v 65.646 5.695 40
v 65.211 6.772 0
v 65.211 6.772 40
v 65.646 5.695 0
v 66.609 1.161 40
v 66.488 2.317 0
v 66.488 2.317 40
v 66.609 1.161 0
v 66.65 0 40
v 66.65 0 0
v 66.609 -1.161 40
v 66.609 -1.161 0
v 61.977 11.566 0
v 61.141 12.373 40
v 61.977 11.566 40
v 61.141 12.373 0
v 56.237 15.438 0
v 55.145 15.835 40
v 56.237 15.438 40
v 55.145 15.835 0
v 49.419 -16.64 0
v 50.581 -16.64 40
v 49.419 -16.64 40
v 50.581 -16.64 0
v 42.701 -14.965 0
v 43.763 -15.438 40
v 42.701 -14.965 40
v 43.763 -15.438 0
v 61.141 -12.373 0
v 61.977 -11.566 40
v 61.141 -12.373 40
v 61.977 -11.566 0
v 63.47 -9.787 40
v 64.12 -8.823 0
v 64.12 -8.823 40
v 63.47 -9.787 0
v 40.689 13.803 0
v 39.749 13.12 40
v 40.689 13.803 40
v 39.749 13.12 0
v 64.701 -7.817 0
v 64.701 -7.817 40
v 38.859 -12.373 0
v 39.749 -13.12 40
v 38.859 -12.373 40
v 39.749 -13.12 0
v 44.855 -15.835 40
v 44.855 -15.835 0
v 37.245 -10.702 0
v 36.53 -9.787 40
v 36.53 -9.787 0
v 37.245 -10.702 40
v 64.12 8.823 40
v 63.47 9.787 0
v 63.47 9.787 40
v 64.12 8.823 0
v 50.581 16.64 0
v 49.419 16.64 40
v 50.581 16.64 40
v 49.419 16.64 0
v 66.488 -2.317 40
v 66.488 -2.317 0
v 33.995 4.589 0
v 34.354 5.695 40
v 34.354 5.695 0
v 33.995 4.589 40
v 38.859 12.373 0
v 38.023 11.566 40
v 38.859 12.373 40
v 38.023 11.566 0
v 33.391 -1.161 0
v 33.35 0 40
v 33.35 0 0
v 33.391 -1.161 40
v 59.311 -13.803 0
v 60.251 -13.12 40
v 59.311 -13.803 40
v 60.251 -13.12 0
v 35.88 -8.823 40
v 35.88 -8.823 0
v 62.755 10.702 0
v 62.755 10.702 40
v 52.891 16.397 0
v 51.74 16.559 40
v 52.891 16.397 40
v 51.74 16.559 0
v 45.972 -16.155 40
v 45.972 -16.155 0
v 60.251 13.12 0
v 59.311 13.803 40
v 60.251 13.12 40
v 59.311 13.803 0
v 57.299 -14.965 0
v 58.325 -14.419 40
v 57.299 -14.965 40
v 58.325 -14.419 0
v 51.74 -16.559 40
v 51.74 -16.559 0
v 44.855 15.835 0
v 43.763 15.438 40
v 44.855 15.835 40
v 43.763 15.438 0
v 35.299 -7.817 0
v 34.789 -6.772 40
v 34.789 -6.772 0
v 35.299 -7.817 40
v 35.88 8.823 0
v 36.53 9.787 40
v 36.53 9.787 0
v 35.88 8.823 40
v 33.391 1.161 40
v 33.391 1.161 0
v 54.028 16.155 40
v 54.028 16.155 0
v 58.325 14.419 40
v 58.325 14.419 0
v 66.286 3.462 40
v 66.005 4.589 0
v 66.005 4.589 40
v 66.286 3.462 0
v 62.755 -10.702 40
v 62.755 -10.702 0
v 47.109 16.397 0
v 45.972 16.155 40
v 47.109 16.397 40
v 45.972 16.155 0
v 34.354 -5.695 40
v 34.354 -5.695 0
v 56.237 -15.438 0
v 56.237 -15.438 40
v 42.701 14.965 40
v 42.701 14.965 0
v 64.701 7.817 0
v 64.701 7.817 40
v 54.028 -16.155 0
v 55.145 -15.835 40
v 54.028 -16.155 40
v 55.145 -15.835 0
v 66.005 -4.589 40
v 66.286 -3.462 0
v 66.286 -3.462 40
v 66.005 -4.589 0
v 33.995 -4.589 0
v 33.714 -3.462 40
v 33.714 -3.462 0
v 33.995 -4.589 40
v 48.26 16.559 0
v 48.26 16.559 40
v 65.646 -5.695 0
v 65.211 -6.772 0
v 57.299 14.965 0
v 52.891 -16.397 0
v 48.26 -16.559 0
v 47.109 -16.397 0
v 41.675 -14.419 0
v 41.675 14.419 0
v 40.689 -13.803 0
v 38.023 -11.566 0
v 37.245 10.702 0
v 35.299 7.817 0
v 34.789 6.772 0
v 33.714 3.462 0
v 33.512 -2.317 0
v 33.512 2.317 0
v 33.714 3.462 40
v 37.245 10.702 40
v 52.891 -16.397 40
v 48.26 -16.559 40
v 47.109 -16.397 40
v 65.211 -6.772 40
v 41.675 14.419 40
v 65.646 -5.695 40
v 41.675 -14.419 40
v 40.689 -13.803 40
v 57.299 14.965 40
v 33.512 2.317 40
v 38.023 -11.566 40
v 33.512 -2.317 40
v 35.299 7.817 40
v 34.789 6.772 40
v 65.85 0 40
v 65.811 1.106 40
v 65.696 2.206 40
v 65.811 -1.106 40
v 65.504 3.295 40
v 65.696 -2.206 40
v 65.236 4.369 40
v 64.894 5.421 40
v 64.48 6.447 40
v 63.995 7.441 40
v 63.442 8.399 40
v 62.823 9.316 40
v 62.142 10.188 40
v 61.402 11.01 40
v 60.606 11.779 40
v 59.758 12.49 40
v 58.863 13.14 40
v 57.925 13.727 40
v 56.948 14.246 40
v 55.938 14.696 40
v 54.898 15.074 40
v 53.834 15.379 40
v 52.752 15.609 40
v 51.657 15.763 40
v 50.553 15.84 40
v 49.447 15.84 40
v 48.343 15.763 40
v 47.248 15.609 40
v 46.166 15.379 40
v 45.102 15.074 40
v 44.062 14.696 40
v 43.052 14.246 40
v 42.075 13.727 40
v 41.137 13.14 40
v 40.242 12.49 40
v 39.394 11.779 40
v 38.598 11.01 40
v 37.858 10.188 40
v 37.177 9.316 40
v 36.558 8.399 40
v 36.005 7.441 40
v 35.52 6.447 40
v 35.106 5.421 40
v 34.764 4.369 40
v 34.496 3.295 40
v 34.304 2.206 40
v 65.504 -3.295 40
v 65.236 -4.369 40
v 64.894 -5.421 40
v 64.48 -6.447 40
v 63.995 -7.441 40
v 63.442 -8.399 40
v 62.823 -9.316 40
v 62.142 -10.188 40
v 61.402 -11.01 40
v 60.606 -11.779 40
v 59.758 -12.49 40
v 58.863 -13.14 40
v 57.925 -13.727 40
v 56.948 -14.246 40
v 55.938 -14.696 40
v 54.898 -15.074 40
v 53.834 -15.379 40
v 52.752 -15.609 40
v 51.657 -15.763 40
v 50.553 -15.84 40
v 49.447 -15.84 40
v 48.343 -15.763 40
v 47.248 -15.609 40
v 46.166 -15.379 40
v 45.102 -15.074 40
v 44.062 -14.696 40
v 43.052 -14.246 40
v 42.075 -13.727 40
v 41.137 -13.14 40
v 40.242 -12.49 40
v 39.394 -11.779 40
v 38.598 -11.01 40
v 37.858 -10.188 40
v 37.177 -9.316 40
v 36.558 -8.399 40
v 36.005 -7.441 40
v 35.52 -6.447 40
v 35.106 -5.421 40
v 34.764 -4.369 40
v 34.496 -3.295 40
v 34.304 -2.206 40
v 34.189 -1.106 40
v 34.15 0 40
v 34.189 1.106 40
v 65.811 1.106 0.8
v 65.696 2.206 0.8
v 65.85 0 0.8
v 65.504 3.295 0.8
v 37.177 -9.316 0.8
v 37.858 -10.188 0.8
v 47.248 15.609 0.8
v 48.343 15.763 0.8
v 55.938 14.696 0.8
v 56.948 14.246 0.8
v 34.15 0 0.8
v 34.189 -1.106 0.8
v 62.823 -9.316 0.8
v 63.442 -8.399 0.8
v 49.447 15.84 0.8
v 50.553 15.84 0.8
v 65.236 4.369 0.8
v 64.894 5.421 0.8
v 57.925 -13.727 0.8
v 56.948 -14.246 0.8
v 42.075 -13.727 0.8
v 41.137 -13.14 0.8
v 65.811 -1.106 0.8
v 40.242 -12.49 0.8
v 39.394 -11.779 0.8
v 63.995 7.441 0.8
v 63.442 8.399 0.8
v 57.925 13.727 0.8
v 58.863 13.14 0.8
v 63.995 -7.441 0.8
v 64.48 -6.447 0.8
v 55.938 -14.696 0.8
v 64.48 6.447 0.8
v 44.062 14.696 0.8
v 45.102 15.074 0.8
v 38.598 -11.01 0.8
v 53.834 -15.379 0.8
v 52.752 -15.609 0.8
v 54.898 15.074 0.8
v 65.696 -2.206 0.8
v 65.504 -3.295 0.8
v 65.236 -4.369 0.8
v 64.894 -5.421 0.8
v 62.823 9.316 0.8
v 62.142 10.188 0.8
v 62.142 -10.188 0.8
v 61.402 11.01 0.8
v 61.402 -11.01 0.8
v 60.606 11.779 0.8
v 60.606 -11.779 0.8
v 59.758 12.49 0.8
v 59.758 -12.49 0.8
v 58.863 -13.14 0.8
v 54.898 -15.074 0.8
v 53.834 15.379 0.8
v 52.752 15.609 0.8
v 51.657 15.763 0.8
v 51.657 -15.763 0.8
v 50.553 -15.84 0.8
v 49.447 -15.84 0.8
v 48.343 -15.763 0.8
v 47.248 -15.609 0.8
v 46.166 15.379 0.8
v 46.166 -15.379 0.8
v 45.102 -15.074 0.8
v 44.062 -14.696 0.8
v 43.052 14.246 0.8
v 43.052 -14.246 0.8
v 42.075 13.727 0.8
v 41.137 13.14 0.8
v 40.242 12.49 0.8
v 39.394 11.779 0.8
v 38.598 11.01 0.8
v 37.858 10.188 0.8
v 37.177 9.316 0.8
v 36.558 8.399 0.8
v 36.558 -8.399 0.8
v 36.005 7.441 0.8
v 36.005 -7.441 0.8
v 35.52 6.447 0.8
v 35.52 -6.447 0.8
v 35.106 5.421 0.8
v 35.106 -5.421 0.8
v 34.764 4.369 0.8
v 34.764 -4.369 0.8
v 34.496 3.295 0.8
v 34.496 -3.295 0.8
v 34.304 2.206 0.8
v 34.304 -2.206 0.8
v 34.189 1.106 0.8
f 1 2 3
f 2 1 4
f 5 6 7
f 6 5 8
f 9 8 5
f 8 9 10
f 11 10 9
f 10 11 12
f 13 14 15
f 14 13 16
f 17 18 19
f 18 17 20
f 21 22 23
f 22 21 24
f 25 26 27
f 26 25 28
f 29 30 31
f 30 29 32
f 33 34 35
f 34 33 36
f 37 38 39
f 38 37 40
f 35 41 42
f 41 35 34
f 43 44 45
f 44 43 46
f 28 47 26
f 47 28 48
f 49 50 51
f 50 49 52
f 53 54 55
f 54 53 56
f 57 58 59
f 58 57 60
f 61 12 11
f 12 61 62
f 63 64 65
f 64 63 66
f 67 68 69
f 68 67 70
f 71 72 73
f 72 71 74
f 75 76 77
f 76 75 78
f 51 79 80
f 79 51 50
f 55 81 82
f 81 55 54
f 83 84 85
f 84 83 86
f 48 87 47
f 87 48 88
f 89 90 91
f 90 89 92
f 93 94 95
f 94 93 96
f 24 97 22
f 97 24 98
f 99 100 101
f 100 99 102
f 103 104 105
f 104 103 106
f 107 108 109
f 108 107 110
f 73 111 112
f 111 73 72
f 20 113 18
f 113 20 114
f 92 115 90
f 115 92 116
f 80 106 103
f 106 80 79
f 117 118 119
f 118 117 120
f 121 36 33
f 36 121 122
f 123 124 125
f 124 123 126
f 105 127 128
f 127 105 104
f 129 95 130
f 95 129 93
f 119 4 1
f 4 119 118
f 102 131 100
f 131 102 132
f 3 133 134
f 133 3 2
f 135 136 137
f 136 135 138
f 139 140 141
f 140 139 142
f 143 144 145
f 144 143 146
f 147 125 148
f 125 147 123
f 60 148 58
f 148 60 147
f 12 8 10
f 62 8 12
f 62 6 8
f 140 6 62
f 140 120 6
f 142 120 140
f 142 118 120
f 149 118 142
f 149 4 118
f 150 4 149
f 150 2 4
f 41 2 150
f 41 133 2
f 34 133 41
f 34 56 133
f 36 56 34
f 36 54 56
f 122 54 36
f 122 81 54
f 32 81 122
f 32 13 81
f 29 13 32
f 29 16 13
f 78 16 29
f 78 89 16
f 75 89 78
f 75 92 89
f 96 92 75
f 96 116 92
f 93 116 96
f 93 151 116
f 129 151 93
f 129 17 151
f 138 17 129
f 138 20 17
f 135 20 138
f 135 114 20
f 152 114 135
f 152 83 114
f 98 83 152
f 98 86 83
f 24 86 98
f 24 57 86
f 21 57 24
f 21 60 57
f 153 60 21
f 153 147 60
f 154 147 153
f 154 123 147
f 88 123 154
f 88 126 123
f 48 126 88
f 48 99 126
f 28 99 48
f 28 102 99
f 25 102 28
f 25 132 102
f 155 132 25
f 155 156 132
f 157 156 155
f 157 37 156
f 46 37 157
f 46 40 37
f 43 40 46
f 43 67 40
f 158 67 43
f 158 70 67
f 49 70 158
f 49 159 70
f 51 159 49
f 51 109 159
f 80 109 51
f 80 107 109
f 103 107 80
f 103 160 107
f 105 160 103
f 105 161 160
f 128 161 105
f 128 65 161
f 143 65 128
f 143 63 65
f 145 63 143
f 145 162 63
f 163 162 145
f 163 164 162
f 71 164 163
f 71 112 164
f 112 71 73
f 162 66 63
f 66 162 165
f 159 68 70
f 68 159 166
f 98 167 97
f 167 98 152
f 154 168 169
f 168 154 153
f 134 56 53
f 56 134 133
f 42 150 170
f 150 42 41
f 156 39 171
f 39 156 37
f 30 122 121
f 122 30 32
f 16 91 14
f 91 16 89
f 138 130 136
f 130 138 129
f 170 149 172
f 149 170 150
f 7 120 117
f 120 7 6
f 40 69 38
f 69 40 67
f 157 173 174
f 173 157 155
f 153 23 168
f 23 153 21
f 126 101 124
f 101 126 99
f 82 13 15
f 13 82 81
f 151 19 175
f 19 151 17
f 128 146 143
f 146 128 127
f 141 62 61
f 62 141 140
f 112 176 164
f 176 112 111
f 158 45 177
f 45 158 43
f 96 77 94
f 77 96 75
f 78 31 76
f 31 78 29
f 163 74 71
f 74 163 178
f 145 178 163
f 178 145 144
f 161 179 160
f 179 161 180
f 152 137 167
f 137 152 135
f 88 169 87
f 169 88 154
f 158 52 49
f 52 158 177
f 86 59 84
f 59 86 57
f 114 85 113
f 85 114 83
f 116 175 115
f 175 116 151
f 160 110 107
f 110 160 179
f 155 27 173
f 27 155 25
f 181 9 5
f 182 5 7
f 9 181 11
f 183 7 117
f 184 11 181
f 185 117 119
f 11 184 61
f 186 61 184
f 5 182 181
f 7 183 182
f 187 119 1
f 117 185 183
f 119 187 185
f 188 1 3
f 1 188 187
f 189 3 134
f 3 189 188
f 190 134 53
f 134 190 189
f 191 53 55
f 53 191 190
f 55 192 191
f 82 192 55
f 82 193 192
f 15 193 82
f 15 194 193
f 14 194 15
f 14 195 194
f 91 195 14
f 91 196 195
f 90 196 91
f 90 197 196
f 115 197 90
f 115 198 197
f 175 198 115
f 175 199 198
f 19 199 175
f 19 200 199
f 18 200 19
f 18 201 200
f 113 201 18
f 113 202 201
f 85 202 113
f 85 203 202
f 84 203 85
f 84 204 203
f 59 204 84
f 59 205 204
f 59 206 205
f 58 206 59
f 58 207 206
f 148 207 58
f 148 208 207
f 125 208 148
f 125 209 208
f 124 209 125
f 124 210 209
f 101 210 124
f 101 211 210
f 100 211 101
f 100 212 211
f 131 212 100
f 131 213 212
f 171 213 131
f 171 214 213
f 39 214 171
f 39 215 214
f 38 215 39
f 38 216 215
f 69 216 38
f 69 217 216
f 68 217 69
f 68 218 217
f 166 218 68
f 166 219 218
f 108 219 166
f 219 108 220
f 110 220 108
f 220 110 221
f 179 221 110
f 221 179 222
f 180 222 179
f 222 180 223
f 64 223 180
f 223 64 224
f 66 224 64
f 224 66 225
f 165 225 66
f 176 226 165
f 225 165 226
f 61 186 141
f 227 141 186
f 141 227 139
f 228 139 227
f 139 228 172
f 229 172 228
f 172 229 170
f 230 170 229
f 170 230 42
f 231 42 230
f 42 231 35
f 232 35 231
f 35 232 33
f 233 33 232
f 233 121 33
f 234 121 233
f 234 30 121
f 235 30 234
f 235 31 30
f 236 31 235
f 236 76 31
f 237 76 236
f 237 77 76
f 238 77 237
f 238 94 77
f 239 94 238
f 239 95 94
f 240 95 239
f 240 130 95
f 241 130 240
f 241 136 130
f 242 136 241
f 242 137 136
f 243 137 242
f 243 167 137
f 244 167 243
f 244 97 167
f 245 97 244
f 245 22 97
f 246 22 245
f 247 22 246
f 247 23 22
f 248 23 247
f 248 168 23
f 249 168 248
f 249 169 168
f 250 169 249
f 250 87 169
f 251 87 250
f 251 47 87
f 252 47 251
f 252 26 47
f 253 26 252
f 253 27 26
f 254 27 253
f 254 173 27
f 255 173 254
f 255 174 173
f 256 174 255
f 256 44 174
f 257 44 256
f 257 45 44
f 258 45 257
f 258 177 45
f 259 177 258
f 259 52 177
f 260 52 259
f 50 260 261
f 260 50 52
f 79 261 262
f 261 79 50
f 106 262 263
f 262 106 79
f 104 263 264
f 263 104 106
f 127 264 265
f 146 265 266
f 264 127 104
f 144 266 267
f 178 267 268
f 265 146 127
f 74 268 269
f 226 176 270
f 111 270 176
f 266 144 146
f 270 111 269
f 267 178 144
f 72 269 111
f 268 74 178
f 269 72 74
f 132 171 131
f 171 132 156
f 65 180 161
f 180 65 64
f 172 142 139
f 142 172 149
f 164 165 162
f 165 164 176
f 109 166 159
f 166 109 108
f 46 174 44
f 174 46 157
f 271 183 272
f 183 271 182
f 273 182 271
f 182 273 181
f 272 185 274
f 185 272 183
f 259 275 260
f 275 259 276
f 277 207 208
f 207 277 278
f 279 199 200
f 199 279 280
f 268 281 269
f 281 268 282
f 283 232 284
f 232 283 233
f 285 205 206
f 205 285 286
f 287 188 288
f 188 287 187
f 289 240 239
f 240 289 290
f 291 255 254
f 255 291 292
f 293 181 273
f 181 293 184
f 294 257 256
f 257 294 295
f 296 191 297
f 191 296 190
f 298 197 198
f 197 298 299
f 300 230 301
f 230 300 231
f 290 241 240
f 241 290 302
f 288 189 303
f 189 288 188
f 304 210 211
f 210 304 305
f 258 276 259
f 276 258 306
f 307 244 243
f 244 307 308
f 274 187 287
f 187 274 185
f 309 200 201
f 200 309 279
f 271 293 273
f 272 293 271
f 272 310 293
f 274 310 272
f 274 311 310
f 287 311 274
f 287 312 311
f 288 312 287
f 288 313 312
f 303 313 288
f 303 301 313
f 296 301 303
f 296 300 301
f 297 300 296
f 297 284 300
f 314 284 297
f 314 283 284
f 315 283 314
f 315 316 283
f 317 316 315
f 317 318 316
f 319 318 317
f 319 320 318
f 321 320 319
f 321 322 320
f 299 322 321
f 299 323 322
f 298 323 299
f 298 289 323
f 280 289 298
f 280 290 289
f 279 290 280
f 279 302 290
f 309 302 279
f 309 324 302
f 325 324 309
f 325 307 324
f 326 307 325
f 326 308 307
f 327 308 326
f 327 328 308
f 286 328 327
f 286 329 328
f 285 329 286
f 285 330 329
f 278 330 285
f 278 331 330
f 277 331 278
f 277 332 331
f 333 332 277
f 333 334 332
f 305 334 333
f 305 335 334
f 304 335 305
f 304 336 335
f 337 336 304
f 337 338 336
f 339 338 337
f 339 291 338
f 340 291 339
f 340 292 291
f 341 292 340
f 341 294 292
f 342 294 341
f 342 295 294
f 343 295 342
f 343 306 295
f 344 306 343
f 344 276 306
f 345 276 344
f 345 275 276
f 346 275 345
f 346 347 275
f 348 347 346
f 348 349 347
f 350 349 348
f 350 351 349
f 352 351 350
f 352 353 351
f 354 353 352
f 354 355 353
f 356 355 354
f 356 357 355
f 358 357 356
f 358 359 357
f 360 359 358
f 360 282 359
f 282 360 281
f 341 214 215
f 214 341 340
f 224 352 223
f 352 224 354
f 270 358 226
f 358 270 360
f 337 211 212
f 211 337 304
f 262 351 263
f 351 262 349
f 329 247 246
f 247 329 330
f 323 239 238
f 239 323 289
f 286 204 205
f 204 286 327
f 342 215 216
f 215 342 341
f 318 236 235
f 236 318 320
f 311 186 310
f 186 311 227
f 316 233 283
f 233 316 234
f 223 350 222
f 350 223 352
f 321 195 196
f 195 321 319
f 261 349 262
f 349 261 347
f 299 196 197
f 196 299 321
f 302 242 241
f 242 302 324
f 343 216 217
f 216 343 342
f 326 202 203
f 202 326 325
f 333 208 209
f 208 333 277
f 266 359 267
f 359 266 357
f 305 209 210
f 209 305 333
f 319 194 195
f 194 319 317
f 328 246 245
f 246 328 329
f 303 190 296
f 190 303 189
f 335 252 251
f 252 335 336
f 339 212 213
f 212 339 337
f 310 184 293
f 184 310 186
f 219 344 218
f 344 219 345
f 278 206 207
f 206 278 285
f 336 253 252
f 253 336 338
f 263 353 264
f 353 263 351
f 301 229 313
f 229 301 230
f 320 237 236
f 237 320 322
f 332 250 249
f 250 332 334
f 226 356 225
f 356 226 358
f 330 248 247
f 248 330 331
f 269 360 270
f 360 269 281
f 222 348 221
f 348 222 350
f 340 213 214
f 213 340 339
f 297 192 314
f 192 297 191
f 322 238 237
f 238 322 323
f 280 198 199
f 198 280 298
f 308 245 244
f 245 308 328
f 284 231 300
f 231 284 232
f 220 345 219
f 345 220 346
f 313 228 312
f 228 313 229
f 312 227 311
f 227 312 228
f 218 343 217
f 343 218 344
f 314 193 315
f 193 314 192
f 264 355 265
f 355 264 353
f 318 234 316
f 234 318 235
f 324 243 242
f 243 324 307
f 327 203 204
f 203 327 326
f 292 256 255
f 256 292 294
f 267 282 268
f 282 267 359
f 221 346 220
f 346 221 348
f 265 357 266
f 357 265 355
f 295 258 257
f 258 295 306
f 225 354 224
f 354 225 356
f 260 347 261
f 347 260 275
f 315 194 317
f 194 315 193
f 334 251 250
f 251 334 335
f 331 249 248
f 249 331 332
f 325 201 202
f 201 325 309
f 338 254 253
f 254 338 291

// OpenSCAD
$fa=4; // default minimum facet angle is now 4
$fs=0.05; // default minimum facet size is now 0.05 mm

innerRad = 15;
bottomHeight = 15;
totalHeight = 45;
wallThickness = .8;
tolerance = .05;
divideHeight = 5;

// difference() {
//   union() {
//     cylinder(r=innerRad + wallThickness, h = bottomHeight);
//     cylinder(r=innerRad + tolerance + wallThickness * 2, h = divideHeight);
//   }
//   translate([0, 0, wallThickness]) cylinder(r=innerRad, h = bottomHeight + .1);
// }

translate([50, 0, 0]) difference() {
  cylinder(r = innerRad + wallThickness*2 + tolerance, h = totalHeight - divideHeight);
  translate([0, 0, wallThickness]) cylinder(r = innerRad + wallThickness + tolerance, h = totalHeight - divideHeight);
}
